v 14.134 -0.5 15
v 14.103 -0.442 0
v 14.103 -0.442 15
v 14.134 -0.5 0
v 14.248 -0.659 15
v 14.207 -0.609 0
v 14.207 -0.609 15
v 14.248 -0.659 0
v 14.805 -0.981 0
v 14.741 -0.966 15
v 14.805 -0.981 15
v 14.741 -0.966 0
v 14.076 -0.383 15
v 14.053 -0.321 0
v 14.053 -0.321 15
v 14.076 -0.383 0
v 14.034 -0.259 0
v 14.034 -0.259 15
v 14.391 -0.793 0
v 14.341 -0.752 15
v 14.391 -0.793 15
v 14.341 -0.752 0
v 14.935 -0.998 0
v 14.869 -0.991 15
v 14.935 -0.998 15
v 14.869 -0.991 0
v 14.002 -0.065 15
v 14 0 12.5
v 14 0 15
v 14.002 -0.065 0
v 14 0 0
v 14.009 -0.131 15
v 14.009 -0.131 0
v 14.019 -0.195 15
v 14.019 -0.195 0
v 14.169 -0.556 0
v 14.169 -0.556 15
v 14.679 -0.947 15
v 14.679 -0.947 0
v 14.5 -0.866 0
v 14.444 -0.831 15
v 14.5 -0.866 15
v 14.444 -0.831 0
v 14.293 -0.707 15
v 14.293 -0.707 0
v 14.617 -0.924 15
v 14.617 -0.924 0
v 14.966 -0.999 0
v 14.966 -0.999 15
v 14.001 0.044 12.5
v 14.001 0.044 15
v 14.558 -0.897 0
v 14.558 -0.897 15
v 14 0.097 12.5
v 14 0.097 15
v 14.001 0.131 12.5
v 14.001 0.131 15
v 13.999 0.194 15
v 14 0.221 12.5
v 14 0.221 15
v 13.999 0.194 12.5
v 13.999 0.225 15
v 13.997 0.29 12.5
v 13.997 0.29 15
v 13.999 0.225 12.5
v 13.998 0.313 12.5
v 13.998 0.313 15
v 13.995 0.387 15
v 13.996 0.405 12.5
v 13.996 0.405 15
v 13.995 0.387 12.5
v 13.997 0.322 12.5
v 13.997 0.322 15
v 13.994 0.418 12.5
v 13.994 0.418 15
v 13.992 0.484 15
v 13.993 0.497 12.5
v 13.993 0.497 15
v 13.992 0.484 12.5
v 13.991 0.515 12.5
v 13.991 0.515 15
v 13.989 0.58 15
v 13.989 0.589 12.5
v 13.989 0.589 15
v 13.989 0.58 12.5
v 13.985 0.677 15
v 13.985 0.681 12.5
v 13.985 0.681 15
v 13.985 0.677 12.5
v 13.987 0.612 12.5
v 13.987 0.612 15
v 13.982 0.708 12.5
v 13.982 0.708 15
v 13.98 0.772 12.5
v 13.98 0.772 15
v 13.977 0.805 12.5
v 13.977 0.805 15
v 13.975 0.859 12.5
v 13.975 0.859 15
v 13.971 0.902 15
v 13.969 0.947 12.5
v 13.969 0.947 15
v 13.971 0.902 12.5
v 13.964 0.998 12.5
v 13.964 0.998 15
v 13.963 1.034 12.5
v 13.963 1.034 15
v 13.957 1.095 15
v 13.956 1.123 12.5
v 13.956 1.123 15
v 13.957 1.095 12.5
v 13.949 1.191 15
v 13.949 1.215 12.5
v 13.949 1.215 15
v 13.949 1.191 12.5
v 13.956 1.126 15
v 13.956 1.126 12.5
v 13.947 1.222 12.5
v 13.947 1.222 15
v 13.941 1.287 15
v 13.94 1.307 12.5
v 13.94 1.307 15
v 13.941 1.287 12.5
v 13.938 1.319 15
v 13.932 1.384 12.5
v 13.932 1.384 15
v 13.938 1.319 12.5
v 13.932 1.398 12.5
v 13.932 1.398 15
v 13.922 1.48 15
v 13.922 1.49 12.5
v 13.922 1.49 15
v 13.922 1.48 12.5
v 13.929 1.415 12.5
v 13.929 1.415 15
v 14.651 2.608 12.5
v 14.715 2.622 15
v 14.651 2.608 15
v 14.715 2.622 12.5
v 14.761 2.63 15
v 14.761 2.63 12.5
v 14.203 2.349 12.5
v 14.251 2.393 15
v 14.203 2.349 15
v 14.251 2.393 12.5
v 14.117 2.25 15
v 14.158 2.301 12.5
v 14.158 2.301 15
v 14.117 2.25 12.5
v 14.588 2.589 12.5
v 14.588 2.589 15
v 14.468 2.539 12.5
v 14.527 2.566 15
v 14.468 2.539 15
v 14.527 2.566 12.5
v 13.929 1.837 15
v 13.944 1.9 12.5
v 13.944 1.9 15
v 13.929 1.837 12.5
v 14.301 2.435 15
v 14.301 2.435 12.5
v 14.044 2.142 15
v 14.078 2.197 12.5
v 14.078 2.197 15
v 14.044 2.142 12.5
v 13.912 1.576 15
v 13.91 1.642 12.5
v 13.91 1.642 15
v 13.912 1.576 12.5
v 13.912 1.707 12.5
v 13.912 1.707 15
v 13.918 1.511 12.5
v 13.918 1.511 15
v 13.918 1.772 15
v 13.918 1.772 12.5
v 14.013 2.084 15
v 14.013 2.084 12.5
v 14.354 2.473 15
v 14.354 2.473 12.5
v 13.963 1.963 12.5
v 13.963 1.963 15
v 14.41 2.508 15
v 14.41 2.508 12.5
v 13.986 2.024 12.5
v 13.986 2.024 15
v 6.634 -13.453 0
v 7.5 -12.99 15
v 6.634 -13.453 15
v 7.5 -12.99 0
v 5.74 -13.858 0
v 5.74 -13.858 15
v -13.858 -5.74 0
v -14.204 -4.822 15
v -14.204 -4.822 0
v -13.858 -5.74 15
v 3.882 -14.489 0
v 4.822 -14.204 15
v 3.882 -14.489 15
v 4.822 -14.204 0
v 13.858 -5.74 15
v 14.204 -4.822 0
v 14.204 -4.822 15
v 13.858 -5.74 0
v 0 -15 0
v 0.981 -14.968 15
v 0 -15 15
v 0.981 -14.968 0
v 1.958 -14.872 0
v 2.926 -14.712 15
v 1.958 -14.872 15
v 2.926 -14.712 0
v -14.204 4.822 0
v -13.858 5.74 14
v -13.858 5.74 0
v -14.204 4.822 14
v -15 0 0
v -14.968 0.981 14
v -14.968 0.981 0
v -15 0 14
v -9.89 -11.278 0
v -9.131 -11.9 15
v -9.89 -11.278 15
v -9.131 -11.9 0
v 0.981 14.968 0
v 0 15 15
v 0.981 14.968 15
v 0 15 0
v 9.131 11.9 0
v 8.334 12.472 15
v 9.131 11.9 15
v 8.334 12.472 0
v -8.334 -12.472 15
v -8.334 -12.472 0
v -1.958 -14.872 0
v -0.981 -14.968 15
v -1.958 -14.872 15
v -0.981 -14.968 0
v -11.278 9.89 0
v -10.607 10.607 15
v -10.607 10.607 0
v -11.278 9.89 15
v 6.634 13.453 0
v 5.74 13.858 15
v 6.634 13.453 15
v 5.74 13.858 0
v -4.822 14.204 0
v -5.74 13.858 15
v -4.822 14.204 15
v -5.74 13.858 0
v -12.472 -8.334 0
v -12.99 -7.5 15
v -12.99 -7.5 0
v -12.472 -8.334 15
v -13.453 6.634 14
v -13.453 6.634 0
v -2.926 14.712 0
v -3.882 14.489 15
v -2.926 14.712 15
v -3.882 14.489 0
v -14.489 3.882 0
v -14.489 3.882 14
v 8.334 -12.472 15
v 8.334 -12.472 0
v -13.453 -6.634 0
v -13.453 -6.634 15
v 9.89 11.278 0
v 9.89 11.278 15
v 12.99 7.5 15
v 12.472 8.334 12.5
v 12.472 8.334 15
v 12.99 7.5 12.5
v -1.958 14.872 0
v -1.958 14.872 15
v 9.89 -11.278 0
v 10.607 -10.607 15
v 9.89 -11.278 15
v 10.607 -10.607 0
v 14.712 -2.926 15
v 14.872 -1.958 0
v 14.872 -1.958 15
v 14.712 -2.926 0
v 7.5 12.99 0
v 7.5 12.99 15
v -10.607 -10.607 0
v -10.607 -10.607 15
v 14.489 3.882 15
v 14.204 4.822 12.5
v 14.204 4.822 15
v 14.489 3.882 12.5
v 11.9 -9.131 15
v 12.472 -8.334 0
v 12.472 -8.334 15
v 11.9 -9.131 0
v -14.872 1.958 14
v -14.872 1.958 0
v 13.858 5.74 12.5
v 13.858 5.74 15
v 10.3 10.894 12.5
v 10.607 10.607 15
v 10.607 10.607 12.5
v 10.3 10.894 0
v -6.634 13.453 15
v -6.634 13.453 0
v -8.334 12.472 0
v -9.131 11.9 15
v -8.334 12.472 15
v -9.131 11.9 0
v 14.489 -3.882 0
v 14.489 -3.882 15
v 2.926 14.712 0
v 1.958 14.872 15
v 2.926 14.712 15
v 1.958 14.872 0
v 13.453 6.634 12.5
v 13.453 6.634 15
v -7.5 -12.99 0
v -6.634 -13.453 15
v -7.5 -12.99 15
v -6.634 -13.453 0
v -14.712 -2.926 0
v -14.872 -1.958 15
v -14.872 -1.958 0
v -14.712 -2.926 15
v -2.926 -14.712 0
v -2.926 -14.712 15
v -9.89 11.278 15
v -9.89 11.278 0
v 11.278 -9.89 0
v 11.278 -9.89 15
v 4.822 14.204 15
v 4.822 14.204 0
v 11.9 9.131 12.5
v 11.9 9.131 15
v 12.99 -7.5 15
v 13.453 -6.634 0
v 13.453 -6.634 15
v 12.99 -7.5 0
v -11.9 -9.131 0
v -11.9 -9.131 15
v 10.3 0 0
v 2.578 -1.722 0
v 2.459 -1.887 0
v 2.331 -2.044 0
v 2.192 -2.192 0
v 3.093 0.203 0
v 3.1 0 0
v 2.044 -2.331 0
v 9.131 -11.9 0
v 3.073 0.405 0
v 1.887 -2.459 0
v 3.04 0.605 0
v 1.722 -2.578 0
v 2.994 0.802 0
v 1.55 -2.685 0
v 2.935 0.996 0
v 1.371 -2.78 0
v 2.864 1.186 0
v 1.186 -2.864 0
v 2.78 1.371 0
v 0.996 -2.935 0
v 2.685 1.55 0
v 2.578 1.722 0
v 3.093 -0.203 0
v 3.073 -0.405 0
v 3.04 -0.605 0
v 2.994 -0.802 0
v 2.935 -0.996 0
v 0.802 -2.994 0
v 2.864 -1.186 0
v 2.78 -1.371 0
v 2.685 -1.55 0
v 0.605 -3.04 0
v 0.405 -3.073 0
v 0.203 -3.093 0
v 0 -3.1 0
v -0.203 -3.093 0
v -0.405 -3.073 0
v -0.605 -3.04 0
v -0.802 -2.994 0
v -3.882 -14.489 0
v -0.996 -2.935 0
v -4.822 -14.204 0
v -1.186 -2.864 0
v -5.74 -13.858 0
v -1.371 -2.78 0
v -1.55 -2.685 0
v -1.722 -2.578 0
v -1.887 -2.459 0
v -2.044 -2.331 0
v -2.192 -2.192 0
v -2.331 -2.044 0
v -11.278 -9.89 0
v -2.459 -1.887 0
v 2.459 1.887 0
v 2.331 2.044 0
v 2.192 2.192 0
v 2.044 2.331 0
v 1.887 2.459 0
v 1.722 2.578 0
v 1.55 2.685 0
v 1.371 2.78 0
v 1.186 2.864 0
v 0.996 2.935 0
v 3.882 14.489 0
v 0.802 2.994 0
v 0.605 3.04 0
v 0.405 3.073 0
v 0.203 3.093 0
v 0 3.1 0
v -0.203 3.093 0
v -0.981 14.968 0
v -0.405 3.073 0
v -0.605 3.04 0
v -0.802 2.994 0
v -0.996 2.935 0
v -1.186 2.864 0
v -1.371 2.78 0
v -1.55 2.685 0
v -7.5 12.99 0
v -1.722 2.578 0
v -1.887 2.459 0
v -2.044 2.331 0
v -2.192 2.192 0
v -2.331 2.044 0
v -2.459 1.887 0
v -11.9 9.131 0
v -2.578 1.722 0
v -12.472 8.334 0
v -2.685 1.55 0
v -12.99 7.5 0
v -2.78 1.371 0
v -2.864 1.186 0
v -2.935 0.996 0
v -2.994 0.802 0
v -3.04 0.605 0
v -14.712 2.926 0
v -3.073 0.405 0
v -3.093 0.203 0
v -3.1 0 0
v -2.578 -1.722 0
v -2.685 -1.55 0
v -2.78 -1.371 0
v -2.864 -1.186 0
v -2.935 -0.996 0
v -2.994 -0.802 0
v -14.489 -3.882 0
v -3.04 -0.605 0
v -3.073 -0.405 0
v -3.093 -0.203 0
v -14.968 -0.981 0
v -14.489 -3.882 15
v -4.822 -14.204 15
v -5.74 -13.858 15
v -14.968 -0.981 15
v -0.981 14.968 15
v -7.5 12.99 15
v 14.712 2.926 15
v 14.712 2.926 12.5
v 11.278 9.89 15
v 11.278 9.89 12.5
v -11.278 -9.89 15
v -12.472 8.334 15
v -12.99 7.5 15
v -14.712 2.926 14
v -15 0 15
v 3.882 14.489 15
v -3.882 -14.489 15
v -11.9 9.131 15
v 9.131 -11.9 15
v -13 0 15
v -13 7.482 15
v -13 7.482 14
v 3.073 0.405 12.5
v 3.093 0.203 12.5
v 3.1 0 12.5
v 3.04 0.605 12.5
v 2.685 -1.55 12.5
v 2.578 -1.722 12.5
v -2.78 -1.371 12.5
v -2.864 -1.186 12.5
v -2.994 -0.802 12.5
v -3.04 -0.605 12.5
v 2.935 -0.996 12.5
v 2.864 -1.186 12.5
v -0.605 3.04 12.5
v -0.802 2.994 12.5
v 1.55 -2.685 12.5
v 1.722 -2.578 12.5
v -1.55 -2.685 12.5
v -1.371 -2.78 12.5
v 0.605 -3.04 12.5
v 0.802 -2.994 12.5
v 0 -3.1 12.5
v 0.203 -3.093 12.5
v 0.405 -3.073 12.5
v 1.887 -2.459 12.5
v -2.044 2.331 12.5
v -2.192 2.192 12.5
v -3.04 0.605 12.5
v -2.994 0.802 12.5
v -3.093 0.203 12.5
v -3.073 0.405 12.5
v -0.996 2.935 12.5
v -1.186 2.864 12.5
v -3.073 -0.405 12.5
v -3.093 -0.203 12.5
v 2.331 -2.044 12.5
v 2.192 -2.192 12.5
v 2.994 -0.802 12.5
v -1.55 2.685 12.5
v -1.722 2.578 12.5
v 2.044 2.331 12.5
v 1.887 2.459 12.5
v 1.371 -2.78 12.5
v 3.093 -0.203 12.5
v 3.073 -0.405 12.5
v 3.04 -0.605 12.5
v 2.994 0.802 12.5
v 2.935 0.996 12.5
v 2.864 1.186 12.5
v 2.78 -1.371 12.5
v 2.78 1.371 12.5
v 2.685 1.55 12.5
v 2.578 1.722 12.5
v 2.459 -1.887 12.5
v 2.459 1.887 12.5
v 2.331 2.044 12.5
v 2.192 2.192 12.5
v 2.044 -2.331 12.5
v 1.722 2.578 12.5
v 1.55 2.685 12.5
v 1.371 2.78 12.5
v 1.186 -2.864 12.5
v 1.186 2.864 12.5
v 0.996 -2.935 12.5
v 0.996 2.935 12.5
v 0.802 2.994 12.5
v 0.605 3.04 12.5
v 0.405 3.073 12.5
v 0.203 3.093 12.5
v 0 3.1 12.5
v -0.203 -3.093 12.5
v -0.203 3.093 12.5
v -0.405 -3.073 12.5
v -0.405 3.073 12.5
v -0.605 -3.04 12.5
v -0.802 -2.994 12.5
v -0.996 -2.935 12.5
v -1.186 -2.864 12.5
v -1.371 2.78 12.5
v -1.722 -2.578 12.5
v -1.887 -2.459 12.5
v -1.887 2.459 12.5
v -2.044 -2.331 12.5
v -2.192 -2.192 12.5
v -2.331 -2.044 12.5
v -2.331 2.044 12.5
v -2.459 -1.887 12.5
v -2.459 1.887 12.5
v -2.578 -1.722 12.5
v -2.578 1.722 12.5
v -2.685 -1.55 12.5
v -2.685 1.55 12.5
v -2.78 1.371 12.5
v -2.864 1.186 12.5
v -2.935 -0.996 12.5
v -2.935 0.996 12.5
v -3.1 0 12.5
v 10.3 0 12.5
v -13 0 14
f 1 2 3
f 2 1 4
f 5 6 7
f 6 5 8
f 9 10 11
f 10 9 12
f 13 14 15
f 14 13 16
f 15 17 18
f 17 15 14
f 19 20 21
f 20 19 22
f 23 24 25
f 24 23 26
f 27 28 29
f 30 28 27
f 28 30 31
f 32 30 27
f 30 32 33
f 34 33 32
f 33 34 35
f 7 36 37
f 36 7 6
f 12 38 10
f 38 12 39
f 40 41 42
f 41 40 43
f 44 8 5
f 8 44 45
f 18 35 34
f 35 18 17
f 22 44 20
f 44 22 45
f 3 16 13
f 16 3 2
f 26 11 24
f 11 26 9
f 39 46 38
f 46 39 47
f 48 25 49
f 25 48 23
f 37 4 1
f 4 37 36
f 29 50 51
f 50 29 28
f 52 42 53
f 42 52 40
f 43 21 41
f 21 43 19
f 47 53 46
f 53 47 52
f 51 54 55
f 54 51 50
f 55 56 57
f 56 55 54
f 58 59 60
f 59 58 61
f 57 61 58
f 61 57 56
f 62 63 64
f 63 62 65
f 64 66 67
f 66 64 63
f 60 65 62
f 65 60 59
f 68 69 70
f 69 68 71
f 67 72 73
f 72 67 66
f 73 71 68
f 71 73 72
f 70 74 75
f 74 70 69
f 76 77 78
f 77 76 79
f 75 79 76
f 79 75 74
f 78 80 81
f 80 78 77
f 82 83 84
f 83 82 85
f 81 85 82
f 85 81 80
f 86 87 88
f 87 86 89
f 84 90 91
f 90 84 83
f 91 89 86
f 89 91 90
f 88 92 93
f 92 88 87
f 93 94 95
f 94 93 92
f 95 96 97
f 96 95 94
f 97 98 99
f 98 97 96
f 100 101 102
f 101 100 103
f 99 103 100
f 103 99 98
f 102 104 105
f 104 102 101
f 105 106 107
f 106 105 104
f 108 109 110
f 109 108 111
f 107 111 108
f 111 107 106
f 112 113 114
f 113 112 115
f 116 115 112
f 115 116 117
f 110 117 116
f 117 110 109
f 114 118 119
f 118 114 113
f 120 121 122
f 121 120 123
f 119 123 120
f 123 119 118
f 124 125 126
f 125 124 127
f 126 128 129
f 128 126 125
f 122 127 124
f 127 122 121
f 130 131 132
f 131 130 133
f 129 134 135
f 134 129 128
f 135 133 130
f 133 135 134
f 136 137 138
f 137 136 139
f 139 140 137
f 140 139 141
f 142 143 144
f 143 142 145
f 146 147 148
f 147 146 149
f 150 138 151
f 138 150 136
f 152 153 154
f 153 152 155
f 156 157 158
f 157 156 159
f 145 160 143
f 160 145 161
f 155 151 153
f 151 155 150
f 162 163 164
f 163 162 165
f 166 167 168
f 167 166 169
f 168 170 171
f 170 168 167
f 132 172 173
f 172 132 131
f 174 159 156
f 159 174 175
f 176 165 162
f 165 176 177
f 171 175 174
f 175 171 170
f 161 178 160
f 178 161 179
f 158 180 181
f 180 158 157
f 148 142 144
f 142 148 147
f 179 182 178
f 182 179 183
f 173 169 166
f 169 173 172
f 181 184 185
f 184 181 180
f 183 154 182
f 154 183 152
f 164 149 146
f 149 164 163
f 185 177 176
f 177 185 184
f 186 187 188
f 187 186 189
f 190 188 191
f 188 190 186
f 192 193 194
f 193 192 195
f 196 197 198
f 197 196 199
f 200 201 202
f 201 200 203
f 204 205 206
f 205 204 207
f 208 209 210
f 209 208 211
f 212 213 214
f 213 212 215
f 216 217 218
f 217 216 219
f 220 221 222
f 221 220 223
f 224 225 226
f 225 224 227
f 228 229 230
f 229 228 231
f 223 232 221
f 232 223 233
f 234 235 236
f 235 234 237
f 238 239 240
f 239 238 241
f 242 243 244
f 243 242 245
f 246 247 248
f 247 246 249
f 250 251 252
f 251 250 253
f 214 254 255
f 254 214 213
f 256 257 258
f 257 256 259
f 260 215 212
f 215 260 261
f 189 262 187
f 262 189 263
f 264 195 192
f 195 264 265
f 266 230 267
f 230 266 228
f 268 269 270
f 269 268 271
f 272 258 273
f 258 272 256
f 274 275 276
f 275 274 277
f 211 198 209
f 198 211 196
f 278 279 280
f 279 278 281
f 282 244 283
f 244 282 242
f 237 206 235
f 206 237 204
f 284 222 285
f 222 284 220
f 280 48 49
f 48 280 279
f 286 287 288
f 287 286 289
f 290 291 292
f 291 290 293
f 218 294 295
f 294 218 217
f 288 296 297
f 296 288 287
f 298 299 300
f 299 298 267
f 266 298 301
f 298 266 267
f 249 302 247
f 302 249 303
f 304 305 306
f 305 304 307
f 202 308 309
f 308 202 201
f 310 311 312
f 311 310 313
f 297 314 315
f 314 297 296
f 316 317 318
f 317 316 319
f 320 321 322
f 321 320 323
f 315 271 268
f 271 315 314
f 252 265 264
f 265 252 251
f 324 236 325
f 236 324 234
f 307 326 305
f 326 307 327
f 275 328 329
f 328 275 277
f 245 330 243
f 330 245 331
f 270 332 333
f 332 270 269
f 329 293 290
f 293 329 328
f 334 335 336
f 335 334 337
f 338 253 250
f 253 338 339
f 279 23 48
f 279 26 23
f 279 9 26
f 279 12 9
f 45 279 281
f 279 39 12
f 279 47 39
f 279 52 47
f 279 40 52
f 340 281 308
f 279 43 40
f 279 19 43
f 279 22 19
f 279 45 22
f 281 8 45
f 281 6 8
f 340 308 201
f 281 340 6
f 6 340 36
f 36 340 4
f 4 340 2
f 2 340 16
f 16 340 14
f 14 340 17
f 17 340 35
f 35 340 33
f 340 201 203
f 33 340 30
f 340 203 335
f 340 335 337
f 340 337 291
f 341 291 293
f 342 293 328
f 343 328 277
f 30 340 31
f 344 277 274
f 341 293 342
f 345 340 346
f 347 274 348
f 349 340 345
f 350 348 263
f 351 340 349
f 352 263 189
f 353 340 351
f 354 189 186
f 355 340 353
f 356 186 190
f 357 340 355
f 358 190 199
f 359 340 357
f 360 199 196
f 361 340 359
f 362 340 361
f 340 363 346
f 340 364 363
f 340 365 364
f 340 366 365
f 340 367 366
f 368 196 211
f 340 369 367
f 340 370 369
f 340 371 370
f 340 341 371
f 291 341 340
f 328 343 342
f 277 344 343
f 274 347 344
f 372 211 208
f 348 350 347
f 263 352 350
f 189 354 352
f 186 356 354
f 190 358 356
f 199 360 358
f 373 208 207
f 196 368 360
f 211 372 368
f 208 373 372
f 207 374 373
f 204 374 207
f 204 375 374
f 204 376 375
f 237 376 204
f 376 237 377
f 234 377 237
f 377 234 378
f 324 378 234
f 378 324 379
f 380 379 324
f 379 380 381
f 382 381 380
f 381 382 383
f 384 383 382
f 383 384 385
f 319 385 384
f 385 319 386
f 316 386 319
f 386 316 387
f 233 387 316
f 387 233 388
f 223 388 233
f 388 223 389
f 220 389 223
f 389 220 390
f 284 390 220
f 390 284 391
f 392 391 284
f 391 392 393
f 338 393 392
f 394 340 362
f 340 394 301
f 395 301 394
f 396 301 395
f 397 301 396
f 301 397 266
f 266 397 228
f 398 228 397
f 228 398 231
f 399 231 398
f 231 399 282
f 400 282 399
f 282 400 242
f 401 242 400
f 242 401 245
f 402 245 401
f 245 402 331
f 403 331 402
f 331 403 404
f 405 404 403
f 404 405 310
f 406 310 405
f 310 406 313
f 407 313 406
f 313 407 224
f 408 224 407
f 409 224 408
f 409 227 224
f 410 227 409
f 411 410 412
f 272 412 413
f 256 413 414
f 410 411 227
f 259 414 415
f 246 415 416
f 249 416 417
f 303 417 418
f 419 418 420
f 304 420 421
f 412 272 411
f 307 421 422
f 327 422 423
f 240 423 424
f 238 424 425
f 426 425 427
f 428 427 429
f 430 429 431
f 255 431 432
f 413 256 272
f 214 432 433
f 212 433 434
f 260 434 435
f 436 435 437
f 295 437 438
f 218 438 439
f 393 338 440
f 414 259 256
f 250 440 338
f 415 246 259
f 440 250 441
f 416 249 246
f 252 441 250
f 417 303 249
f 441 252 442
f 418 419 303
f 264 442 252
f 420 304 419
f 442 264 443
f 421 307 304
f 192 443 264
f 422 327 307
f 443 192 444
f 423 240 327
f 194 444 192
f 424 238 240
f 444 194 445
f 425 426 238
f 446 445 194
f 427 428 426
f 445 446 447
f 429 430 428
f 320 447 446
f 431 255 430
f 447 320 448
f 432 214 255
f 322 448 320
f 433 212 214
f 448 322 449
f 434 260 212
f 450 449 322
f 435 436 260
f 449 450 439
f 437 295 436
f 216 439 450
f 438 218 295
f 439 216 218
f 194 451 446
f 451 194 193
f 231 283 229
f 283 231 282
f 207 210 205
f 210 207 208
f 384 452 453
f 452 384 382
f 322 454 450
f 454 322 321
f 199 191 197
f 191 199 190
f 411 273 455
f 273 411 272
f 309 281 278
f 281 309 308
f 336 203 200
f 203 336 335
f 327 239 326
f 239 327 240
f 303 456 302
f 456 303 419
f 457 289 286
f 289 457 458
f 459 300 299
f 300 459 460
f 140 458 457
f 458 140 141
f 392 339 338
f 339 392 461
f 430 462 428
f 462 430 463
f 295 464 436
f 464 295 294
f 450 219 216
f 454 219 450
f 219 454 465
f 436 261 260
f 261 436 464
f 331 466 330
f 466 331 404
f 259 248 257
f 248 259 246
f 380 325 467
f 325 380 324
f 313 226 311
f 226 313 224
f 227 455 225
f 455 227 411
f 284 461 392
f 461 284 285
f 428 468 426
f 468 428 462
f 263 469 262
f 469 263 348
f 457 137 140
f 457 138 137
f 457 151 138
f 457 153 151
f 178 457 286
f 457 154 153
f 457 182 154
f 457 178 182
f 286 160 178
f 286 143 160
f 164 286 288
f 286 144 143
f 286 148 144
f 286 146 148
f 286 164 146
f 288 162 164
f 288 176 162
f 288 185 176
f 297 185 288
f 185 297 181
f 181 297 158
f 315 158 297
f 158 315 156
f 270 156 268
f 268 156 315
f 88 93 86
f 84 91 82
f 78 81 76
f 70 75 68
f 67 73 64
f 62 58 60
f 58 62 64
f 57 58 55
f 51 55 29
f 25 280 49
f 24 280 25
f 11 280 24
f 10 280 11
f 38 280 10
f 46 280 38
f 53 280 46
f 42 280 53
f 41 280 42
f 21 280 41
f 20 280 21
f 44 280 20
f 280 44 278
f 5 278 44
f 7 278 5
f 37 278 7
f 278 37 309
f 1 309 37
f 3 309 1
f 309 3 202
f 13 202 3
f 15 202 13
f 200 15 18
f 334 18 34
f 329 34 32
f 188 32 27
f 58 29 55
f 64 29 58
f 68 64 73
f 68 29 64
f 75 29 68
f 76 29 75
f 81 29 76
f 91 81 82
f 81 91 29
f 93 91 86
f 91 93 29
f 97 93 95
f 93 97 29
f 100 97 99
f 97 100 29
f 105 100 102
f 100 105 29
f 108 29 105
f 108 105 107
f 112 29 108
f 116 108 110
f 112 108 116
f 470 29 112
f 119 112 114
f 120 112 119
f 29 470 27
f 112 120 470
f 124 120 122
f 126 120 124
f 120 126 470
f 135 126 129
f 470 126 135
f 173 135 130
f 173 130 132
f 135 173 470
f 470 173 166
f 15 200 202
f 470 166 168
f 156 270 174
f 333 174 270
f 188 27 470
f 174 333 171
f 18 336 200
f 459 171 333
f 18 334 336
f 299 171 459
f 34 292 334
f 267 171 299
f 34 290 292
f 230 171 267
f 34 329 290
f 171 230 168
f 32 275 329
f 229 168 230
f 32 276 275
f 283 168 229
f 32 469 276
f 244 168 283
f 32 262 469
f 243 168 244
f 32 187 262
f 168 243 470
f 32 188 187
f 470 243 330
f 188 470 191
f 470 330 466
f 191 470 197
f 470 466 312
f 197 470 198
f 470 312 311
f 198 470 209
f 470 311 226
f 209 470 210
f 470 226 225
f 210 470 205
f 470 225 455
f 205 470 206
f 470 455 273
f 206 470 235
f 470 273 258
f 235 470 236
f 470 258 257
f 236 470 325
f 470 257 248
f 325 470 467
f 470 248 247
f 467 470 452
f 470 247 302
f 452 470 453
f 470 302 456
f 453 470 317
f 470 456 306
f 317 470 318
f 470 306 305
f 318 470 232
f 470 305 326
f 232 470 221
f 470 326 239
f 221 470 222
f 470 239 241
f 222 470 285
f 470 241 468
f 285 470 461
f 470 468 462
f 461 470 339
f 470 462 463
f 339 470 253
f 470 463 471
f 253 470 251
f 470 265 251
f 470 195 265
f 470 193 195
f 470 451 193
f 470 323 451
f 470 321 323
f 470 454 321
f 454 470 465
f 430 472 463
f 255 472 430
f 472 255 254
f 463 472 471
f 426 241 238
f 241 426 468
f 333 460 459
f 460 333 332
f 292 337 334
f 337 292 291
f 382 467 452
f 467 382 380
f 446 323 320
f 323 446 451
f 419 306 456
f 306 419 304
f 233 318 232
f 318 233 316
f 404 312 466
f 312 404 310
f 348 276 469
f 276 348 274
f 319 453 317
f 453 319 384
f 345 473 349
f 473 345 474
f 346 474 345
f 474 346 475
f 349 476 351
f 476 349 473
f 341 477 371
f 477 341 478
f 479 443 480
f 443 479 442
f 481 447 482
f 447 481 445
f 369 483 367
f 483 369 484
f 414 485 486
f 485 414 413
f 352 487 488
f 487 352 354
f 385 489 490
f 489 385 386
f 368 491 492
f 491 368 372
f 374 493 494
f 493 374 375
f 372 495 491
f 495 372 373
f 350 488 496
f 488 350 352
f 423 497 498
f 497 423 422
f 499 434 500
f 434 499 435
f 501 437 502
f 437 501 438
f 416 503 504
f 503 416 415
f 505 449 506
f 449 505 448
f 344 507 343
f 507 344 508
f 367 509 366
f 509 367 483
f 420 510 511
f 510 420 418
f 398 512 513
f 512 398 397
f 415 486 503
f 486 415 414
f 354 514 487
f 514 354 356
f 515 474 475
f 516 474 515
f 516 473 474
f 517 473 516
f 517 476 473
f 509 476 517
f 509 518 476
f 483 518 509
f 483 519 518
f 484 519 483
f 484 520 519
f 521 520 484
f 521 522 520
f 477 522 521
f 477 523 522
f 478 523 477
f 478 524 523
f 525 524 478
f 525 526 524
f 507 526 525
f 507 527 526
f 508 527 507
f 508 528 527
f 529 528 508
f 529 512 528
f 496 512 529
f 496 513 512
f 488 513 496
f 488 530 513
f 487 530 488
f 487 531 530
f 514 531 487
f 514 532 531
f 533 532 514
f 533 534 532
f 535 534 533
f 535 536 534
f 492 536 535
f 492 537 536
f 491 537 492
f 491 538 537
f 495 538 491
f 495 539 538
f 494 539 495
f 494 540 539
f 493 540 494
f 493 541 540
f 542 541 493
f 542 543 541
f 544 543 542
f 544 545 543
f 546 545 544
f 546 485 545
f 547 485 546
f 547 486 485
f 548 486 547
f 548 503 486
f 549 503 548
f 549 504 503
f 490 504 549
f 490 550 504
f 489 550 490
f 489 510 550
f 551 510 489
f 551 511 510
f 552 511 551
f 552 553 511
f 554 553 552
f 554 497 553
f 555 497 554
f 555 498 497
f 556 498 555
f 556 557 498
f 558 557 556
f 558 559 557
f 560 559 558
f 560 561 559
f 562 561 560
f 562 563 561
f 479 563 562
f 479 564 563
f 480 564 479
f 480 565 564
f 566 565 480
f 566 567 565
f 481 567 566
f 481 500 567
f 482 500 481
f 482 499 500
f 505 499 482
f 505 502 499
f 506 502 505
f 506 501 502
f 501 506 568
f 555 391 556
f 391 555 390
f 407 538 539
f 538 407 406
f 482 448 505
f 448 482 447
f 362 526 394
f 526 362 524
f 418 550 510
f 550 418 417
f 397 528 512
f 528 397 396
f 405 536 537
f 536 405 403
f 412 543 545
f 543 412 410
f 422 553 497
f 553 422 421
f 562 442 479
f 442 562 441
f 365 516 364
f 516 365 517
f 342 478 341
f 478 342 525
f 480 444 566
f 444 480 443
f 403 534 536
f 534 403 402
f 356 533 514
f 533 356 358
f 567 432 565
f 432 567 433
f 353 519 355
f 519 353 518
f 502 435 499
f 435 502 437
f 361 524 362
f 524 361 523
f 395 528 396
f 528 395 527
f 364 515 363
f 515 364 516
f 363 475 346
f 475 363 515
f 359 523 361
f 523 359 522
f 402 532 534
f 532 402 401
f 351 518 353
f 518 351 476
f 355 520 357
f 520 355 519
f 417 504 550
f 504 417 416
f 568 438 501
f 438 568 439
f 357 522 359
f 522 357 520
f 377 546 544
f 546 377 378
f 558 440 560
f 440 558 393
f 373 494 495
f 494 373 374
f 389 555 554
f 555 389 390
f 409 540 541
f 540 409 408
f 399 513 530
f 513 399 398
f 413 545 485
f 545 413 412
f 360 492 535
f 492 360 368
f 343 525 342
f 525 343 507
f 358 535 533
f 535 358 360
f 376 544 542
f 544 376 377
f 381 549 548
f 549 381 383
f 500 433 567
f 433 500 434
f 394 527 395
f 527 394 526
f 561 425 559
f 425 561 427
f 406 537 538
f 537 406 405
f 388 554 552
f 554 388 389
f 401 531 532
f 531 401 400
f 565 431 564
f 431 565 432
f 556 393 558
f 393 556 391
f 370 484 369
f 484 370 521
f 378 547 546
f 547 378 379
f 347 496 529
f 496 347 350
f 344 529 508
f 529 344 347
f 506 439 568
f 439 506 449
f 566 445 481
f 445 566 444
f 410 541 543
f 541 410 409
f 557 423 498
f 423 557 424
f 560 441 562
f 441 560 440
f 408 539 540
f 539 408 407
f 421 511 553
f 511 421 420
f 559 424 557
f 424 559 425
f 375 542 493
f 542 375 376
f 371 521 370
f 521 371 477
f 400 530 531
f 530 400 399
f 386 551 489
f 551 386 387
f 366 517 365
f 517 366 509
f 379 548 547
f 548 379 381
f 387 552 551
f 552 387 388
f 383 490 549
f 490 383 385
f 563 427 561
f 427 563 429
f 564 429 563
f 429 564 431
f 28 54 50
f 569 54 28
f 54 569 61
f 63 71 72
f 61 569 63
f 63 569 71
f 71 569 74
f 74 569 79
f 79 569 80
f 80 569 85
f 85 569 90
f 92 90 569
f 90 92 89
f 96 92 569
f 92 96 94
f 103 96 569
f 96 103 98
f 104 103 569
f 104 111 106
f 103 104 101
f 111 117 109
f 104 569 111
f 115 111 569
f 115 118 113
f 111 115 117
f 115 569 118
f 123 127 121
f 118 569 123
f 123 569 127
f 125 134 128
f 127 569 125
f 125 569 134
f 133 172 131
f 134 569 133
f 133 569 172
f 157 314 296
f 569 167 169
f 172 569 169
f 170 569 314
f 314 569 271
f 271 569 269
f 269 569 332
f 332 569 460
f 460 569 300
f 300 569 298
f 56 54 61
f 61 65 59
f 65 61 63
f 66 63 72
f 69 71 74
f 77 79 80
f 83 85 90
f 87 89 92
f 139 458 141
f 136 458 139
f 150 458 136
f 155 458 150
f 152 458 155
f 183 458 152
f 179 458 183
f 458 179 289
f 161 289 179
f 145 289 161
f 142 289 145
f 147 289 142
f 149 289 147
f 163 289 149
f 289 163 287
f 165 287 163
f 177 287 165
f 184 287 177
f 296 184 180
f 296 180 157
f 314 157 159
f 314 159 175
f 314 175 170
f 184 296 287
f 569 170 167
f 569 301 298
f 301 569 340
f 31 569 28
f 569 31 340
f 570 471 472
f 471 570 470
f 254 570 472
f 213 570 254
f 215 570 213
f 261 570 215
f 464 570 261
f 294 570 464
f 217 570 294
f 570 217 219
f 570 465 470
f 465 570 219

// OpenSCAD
// Replacement knob for hotplate stirrer with D-shaft (6 mm)
// Print orientation: side facing hotplate down on bed (z = 0)

// ---------------- Parameters ----------------
knob_d        = 30;    // knob outer diameter
knob_h        = 15;    // knob height
bore_depth    = 12;    // D-shaped blind bore depth from bottom face
shaft_d       = 6.2;   // D-shaft diameter (circle diameter)
flat_to_opp   = 4.7;   // distance from flat of D to opposite side of circle
groove_count  = 18;    // number of vertical grip grooves
groove_d      = 2;     // groove diameter (half-cylinder)
pointer_w     = 1.5;   // pointer groove width
pointer_d     = 1;     // pointer groove depth
eps           = 0.5;   // overcut for clean differences

$fn = 96;
pi = 3.1415926;

// ---------------- Model ----------------
difference() {
    // Main knob body
    cylinder(d = knob_d, h = knob_h);

    // D-shaped blind bore from bottom face
    translate([0, 0, -eps])
        cylinder(d = shaft_d, h = bore_depth + 2 * eps);

    // Flat side of D bore (cut into the cylinder along +X)
    translate([knob_d / 2 - flat_to_opp, 0, -eps])
        cube([flat_to_opp + eps, knob_d / 2 + eps, bore_depth + 2 * eps]);

    // Vertical grip grooves around full height, centred on outer surface
    for (i = [0 : groove_count - 1]) {
        a = (i / (groove_count - 1)) * 2 * pi;
        translate([knob_d / 2 * cos(a), knob_d / 2 * sin(a), -eps])
            cylinder(d = groove_d, h = knob_h + 2 * eps);
    }

    // Pointer groove on top face, same side as D flat (+X)
    translate([-knob_d / 2 - eps, 0, knob_h - pointer_d])
        cube([pointer_w + 2 * eps, knob_d / 2 + eps, pointer_d + 2 * eps]);
}
